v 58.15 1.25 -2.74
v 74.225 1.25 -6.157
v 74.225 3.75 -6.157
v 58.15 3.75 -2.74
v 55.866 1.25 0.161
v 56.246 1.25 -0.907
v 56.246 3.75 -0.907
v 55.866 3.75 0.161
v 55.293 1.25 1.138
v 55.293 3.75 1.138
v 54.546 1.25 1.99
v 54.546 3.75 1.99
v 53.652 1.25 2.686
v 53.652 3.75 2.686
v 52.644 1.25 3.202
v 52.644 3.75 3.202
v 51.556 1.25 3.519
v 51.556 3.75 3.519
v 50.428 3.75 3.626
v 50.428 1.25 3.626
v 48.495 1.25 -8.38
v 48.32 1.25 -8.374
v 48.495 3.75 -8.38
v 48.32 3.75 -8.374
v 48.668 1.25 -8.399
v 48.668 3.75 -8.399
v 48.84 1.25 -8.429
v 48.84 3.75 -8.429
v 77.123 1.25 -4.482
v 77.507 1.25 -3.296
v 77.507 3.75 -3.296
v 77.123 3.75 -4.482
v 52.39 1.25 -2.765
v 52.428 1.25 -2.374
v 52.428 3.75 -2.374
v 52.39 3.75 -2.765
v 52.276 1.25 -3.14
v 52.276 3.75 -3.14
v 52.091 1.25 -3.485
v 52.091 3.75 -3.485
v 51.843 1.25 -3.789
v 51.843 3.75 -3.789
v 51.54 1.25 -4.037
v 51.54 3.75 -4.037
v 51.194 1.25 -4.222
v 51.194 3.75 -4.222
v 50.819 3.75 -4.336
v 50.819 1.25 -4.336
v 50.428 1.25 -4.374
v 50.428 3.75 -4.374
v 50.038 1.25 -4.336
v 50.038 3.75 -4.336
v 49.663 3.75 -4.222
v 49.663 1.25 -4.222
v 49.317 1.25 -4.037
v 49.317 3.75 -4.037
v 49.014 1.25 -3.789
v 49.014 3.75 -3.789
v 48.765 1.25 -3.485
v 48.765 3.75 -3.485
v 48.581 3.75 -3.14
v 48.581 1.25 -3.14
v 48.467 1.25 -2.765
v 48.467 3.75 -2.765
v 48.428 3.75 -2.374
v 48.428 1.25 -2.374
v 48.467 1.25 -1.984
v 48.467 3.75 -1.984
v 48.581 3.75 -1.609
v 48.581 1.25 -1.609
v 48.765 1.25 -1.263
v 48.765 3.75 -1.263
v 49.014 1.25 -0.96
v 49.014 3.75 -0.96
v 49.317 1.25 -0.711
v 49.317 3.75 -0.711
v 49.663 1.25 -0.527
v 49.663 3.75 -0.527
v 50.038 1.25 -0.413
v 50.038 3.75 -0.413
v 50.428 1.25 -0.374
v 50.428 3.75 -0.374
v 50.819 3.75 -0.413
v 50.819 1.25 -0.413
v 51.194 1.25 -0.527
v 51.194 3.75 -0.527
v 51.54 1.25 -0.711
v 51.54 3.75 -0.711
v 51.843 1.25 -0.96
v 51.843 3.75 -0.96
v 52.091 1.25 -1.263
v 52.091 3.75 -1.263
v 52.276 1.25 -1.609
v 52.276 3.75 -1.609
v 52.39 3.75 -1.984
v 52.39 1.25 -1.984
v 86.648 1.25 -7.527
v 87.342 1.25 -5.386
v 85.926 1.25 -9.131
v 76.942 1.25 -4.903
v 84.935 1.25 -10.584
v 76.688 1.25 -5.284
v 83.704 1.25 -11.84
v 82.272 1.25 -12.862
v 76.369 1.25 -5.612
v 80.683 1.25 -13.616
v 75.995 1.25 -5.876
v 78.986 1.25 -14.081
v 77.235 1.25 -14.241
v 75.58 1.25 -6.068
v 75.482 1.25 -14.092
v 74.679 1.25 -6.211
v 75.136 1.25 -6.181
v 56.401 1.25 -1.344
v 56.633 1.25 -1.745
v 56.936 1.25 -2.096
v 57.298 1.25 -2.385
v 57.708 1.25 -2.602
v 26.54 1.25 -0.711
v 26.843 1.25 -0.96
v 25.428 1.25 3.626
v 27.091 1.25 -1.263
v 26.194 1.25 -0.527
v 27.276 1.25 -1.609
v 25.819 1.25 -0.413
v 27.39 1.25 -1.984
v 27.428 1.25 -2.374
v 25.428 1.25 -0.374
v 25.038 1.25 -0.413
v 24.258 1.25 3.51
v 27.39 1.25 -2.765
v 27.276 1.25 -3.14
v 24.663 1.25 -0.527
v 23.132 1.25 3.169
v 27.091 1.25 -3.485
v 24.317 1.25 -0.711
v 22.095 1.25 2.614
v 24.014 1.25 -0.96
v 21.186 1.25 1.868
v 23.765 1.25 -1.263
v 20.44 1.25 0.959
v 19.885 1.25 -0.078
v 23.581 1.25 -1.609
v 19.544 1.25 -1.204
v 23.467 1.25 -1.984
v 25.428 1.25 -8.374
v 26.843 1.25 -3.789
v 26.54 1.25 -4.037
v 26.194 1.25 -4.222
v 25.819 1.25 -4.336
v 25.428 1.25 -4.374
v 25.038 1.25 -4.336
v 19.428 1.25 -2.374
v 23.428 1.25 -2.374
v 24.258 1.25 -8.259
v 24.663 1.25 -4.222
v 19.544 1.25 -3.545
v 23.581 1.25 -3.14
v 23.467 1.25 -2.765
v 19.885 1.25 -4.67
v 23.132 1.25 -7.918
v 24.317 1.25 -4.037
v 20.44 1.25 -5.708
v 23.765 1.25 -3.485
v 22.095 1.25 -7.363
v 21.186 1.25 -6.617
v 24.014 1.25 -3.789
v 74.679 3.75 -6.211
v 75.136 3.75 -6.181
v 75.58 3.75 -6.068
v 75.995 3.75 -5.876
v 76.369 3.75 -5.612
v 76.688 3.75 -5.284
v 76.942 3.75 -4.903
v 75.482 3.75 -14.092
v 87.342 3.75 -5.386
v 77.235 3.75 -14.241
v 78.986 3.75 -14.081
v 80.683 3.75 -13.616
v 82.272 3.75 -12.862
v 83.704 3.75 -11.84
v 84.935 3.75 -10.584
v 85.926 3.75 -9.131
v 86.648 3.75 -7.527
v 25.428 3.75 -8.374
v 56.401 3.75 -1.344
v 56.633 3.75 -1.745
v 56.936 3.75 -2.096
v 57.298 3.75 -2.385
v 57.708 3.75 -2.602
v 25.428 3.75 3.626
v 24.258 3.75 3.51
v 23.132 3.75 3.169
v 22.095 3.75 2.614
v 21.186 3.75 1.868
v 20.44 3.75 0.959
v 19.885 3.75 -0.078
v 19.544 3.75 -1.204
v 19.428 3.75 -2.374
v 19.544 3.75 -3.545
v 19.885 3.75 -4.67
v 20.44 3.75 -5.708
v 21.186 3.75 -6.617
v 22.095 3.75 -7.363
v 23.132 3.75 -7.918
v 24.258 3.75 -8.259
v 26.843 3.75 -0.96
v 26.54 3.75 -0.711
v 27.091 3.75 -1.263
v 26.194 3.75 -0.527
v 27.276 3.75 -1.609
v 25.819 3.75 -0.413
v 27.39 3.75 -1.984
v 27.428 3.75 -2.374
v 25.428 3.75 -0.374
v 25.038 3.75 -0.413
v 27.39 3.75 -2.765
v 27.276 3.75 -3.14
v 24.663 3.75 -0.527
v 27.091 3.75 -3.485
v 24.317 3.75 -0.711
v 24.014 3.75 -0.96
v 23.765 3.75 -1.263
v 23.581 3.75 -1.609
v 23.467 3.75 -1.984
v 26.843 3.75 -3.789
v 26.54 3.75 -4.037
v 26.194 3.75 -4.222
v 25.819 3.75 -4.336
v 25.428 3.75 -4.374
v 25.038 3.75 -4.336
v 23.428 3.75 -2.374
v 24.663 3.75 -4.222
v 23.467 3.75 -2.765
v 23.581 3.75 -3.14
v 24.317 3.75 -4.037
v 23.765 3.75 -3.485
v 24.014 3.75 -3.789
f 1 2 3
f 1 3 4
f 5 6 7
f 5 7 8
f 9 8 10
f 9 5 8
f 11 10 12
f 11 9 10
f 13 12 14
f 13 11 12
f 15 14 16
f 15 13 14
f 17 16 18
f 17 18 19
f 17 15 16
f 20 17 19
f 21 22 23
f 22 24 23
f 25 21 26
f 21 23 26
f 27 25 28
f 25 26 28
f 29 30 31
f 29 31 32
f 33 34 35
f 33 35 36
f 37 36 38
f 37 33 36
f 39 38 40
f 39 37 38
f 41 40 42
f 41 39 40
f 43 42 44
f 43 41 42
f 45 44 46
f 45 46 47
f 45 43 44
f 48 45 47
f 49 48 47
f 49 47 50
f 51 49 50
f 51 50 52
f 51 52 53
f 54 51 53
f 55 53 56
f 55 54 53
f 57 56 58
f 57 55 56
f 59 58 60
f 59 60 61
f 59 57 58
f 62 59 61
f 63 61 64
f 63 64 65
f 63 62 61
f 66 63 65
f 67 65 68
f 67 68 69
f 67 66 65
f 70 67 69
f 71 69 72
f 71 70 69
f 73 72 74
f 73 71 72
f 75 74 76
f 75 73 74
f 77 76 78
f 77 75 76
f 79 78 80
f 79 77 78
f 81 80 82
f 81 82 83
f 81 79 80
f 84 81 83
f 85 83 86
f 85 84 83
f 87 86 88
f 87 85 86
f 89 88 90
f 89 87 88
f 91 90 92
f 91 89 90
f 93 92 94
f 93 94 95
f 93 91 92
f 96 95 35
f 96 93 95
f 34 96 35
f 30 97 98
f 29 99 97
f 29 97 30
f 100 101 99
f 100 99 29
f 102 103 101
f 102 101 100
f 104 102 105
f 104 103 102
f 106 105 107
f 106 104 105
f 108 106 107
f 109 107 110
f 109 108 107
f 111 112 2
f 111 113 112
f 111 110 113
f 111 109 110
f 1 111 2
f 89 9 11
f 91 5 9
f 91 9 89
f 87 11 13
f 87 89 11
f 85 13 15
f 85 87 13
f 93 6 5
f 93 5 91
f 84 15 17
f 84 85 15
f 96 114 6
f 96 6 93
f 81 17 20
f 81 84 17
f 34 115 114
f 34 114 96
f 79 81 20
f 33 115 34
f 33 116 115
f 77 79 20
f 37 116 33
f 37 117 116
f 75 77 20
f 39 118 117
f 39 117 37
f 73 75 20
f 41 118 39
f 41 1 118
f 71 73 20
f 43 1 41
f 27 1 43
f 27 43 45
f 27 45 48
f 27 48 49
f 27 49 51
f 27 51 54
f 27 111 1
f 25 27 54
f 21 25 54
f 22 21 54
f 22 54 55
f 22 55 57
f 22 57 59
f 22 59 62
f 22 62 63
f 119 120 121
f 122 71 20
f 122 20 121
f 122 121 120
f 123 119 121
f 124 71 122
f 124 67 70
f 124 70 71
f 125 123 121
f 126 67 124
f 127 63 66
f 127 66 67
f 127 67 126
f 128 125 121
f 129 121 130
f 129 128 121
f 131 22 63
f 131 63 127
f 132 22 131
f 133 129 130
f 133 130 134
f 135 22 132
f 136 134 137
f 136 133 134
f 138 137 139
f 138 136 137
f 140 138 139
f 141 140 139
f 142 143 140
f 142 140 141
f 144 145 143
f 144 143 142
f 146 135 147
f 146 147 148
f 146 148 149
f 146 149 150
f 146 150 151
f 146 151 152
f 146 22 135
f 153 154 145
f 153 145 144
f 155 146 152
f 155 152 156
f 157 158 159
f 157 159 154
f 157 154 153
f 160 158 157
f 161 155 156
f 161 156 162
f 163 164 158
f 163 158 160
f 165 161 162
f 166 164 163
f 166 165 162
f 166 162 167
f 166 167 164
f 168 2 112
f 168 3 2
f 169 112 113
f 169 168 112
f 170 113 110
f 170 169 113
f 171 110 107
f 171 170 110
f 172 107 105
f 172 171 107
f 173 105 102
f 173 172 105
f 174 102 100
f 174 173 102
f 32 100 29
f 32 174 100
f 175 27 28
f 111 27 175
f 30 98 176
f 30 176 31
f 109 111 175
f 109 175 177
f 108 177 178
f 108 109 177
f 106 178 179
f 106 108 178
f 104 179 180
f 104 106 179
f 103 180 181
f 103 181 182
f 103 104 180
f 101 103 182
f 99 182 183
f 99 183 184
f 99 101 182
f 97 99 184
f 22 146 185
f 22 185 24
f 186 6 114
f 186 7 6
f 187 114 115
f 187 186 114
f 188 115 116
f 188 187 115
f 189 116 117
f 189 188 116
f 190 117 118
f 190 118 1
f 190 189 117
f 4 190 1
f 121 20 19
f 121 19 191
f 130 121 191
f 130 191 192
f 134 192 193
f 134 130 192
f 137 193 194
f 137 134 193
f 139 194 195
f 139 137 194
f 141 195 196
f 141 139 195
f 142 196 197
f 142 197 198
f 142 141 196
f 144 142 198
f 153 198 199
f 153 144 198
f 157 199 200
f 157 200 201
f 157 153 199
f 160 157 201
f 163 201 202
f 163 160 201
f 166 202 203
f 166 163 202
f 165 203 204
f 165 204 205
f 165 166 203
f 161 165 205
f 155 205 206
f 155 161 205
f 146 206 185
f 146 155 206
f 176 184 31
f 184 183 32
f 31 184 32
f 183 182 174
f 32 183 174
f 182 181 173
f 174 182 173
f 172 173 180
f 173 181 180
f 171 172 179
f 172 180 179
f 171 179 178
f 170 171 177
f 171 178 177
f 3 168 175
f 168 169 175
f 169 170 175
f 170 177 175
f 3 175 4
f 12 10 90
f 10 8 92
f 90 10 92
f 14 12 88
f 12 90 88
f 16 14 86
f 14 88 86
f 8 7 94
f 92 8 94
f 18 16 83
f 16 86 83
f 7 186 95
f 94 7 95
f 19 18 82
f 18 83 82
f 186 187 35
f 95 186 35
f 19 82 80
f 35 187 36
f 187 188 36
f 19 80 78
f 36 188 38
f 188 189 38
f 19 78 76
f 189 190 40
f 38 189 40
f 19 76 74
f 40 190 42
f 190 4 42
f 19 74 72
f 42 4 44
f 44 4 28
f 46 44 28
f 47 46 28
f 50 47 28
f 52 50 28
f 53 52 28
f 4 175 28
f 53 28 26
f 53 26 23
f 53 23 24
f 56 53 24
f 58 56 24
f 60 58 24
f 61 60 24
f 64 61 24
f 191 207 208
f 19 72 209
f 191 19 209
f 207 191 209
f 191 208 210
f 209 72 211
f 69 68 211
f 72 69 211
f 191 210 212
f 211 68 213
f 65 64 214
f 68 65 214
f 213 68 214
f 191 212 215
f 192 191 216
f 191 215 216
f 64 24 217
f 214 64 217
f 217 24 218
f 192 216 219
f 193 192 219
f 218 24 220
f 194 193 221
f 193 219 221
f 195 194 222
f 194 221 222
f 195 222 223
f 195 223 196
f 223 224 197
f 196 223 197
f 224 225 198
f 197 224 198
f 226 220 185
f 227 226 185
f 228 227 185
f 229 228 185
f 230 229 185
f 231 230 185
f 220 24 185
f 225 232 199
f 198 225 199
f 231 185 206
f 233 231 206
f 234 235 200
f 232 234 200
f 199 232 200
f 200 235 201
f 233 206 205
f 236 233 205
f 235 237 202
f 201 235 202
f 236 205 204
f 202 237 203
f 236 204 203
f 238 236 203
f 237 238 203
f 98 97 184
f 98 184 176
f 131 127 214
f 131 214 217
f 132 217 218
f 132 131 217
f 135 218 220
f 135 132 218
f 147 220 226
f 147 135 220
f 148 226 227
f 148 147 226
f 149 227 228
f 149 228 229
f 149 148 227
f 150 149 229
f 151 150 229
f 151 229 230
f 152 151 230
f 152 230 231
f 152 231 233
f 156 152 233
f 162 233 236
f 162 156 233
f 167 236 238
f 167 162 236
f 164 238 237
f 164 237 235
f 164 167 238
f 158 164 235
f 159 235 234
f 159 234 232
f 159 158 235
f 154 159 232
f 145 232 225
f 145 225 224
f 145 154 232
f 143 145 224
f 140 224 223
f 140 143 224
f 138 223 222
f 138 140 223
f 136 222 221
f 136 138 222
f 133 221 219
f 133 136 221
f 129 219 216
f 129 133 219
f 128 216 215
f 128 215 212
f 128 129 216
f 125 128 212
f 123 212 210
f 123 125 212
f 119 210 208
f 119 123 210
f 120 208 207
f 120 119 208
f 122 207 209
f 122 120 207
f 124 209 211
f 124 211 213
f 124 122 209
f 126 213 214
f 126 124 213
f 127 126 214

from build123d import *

# Parameters (mm, degrees)
SKETCH1_R           = 4
BOSS_EXTRUDE1_DEPTH = 5
FILLET1_R           = 5
SCALE1_SCALE        = 0.5


with BuildPart() as part:
    # Sketch1 → Boss-Extrude1 (new body)
    with BuildSketch(Plane(origin=(0, 0, 0), x_dir=(1, 0, 0), z_dir=(0, 1, 0))):
        with BuildLine():
            Line((0, 12), (46.309546143, 12))
            Line((46.309546143, 12), (100.107664183, 23.435142995))
            ThreePointArc((100.107664183, 23.435142995), (113.686830565, 20.974303457), (122.439553034, 10.304751439))
            Line((122.439553034, 10.304751439), (123.826560512, 6.023839123))
            Line((123.826560512, 6.023839123), (104.157567187, 1.843065531))
            Line((104.157567187, 1.843065531), (102, 8.502262467))
            Line((102, 8.502262467), (62, 0))
            ThreePointArc((62, 0), (58.485281374, -8.485281374), (50, -12))
            Line((50, -12), (0, -12))
            ThreePointArc((0, -12), (-12, 0), (0, 12))
        make_face()
        Circle(SKETCH1_R, mode=Mode.SUBTRACT)
        with Locations((50, 0)):
            Circle(SKETCH1_R, mode=Mode.SUBTRACT)
    extrude(amount=BOSS_EXTRUDE1_DEPTH)

    # Fillet1
    fillet1_edges = [part.edges().sort_by_distance(p)[0] for p in [
        (102, 2.5, -8.502262467),
        (62, 2.5, 0),
        (46.309546143, 2.5, -12),
    ]]
    fillet(fillet1_edges, radius=FILLET1_R)


with BuildPart() as part_1:
    # Scale1: scaled about (50.856755606, 2.5, -4.748712571)
    add(part.part.scale(SCALE1_SCALE).moved(Location((25.428377803, 1.25, -2.374356286))))


solid = part_1.part
